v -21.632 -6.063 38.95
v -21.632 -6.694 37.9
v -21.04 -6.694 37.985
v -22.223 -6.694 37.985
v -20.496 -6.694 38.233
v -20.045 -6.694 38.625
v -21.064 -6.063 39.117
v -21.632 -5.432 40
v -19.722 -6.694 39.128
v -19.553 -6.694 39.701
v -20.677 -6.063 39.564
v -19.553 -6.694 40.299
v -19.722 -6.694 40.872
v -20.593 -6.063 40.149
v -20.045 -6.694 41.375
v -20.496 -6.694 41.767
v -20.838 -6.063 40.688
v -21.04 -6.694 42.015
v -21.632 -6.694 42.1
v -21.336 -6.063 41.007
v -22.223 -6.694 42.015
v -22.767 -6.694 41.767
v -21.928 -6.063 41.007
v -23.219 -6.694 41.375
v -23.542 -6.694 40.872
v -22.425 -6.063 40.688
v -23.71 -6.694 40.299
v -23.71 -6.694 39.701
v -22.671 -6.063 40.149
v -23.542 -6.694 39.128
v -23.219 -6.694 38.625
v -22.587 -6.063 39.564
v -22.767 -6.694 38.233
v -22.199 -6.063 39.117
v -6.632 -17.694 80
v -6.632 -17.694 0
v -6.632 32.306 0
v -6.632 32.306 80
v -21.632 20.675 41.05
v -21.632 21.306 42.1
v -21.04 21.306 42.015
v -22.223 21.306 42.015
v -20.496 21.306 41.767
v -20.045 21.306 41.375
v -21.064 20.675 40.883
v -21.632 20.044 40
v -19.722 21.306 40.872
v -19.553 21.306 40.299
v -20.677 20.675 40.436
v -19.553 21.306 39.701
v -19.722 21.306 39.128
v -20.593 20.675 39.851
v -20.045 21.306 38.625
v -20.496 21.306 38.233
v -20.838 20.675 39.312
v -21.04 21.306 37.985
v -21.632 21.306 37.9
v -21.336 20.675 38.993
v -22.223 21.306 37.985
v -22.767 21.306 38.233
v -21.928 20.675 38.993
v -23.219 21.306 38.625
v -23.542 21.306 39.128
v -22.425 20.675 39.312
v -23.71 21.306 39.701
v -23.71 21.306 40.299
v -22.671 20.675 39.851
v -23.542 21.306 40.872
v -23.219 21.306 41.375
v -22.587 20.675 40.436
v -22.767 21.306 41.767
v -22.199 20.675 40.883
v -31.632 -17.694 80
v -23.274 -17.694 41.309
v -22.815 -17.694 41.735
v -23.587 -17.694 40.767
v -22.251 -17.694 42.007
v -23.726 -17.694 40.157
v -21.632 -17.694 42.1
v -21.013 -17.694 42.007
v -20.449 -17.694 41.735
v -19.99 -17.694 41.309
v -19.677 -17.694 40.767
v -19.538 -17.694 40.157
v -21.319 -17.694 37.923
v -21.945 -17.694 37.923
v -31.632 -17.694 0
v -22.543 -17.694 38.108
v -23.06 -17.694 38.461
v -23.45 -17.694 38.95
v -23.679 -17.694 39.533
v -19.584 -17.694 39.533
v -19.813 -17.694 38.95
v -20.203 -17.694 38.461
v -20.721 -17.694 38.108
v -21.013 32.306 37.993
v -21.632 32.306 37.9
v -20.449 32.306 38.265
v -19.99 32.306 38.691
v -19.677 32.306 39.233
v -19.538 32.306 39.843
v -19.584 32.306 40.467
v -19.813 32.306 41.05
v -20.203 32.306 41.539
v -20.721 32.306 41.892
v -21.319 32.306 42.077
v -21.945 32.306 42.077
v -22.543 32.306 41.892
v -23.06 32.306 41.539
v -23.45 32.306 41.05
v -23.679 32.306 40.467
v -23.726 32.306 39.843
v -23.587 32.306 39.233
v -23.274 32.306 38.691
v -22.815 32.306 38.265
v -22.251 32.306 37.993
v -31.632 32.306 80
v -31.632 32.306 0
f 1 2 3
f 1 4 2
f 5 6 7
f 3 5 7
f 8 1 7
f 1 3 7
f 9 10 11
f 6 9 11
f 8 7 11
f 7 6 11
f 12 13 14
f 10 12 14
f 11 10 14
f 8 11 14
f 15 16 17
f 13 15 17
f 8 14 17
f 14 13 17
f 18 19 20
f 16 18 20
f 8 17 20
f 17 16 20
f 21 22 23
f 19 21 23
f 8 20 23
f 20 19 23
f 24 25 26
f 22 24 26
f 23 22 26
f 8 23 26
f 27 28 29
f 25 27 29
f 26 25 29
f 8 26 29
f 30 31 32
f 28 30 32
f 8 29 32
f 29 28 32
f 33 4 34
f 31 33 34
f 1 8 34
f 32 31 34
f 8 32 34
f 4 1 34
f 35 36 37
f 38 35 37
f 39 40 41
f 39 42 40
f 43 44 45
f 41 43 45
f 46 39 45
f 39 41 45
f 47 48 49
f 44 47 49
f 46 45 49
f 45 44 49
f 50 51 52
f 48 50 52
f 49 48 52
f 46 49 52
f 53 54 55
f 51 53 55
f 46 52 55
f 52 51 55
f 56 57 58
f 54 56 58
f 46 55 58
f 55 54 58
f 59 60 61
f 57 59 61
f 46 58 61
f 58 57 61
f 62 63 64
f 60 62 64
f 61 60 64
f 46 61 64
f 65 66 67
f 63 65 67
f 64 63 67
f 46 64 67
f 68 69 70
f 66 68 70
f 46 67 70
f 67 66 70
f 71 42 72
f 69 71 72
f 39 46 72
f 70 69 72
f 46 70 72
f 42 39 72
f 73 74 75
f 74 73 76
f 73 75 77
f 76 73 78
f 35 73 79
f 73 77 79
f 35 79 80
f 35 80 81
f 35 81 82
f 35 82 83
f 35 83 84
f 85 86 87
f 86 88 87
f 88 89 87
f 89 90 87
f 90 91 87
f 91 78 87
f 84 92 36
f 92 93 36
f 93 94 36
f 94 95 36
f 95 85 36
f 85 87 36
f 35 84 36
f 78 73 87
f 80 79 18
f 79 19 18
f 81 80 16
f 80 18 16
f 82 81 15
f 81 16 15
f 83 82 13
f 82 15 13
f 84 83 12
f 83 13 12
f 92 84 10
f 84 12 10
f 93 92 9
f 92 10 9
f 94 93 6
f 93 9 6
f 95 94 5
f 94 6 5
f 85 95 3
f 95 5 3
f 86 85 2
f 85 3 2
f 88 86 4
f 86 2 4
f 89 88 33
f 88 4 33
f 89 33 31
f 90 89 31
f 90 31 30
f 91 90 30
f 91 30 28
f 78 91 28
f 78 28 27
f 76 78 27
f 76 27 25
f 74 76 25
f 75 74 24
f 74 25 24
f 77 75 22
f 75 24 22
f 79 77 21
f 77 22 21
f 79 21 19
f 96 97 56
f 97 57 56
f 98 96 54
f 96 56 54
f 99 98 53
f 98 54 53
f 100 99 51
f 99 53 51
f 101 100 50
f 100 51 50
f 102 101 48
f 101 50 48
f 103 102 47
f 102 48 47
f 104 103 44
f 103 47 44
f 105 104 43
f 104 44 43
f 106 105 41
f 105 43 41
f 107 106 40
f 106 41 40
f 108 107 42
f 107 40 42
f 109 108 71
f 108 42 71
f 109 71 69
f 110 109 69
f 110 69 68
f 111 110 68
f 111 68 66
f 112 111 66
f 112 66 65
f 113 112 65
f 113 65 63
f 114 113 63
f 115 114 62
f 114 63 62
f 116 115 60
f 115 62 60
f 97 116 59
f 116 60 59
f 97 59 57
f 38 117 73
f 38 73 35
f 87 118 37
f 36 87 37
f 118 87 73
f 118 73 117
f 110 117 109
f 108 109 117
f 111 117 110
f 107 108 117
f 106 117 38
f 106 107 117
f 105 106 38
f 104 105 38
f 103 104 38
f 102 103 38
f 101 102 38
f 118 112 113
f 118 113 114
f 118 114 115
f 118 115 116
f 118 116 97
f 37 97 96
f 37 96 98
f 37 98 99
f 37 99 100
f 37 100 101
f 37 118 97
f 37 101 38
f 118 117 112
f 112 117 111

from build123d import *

# Parameters (mm, degrees)
CROQUIS1_W                                     = 25
CROQUIS1_H                                     = 50
SALIENTE_EXTRUIR1_DEPTH                        = 80
PERFORADOR_PARA_ROSCAR_PARA_MACHO_DE_ROS_D     = 4.2
PERFORADOR_PARA_ROSCAR_PARA_MACHO_DE_ROS_DEPTH = 11
PERFORADOR_PARA_ROSCAR_PARA_MACHO_DE_ROS_TIP   = 1.2618073
PERFORADOR_PARA_ROSCAR_PARA_MACHO_DE_2_D       = 4.2
PERFORADOR_PARA_ROSCAR_PARA_MACHO_DE_2_DEPTH   = 11
PERFORADOR_PARA_ROSCAR_PARA_MACHO_DE_2_TIP     = 1.2618073


with BuildPart() as part:
    # Croquis1 → Saliente-Extruir1 (new body)
    with BuildSketch(Plane.XY):
        with Locations((-19.131816286, 7.30620438)):
            Rectangle(CROQUIS1_W, CROQUIS1_H)
    extrude(amount=SALIENTE_EXTRUIR1_DEPTH)

    # Perforador para roscar para macho de ros
    with Locations(Plane(origin=(-21.631816286, 32.30620438, 40), x_dir=(0, 0, 1), z_dir=(0, 1, 0))):
        with Locations((0, 0)):
            Hole(PERFORADOR_PARA_ROSCAR_PARA_MACHO_DE_ROS_D / 2, depth=PERFORADOR_PARA_ROSCAR_PARA_MACHO_DE_ROS_DEPTH)
            with Locations((0, 0, -(PERFORADOR_PARA_ROSCAR_PARA_MACHO_DE_ROS_DEPTH + PERFORADOR_PARA_ROSCAR_PARA_MACHO_DE_ROS_TIP / 2))):  # 118° drill point
                Cone(0, PERFORADOR_PARA_ROSCAR_PARA_MACHO_DE_ROS_D / 2, PERFORADOR_PARA_ROSCAR_PARA_MACHO_DE_ROS_TIP, mode=Mode.SUBTRACT)

    # Perforador para roscar para macho de 2
    with Locations(Plane(origin=(-21.631816286, -17.69379562, 40), x_dir=(0, 0, -1), z_dir=(0, -1, 0))):
        with Locations((0, 0)):
            Hole(PERFORADOR_PARA_ROSCAR_PARA_MACHO_DE_2_D / 2, depth=PERFORADOR_PARA_ROSCAR_PARA_MACHO_DE_2_DEPTH)
            with Locations((0, 0, -(PERFORADOR_PARA_ROSCAR_PARA_MACHO_DE_2_DEPTH + PERFORADOR_PARA_ROSCAR_PARA_MACHO_DE_2_TIP / 2))):  # 118° drill point
                Cone(0, PERFORADOR_PARA_ROSCAR_PARA_MACHO_DE_2_D / 2, PERFORADOR_PARA_ROSCAR_PARA_MACHO_DE_2_TIP, mode=Mode.SUBTRACT)


solid = part.part
